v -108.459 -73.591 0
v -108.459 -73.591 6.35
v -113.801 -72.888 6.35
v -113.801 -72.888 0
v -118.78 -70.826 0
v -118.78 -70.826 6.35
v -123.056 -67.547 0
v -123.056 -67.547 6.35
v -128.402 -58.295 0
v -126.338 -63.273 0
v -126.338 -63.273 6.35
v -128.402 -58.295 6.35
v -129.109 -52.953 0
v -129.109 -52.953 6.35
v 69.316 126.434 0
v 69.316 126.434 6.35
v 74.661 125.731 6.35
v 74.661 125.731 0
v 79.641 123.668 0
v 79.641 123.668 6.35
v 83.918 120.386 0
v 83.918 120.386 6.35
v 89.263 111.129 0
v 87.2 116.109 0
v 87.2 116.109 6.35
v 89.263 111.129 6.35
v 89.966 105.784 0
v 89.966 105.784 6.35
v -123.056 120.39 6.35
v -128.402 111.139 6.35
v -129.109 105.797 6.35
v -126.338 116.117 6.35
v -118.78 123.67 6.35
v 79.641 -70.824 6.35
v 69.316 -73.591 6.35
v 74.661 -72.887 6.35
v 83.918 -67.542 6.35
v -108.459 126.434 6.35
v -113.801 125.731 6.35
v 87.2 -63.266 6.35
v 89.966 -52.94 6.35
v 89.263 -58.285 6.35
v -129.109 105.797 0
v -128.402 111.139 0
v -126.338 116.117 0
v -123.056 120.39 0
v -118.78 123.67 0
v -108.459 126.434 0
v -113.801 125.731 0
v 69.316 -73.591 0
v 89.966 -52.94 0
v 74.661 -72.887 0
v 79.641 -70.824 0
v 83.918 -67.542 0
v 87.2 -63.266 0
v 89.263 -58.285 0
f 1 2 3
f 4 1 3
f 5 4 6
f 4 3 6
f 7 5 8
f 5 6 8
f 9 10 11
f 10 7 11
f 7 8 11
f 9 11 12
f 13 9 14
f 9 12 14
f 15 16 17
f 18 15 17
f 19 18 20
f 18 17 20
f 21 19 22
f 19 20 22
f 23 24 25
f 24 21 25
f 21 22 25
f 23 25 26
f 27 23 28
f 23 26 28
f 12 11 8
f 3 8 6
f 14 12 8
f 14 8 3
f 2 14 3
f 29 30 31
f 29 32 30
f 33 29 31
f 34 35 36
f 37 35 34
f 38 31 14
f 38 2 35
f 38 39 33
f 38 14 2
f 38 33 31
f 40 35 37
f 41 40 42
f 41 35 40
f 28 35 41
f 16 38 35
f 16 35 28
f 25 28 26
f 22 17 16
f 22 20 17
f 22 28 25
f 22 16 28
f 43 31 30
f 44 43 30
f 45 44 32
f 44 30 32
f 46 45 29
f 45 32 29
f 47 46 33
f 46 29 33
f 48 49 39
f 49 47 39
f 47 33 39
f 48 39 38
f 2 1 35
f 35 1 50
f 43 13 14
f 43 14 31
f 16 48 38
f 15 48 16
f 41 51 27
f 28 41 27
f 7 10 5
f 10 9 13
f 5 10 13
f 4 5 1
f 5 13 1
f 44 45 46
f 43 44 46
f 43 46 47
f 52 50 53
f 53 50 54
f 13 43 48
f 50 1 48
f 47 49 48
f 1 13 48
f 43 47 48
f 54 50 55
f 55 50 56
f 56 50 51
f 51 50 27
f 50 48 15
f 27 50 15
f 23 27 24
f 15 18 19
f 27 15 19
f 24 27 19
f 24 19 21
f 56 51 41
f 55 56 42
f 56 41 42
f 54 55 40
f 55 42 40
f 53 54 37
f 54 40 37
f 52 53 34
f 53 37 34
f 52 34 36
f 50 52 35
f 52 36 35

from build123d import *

# Parameters (mm, degrees)
F0_W     = 219.075
F0_H     = 200.025
F1_DEPTH = 6.35
F3_DEPTH = 6.351


with BuildPart() as f1:
    # F0 (on Top) → F1 (new body)
    with BuildSketch(Plane.XY):
        with Locations((-19.571357, 26.421812)):
            Rectangle(F0_W, F0_H)
    extrude(amount=F1_DEPTH)

    # F2 (on face) → F3 (cut, through all)
    with BuildSketch(Plane.XY.offset(6.35)):
        with BuildLine():
            Line((89.966143, 126.434312), (69.315943, 126.434312))
            ThreePointArc((69.315943, 126.434312), (83.91784, 120.386009), (89.966143, 105.784112))
            Line((89.966143, 105.784112), (89.966143, 126.434312))
        make_face()
        with BuildLine():
            Line((-129.108857, 126.434312), (-129.108857, 105.796812))
            ThreePointArc((-129.108857, 105.796812), (-123.056064, 120.390499), (-108.458657, 126.434312))
            Line((-108.458657, 126.434312), (-129.108857, 126.434312))
        make_face()
        with BuildLine():
            ThreePointArc((-108.458657, -73.590688), (-123.056064, -67.546874), (-129.108857, -52.953188))
            Line((-129.108857, -52.953188), (-129.108857, -73.590688))
            Line((-129.108857, -73.590688), (-108.458657, -73.590688))
        make_face()
        with BuildLine():
            ThreePointArc((89.966143, -52.940488), (83.91784, -67.542384), (69.315943, -73.590688))
            Line((69.315943, -73.590688), (89.966143, -73.590688))
            Line((89.966143, -73.590688), (89.966143, -52.940488))
        make_face()
    extrude(amount=-F3_DEPTH, mode=Mode.SUBTRACT)


solid = f1.part
